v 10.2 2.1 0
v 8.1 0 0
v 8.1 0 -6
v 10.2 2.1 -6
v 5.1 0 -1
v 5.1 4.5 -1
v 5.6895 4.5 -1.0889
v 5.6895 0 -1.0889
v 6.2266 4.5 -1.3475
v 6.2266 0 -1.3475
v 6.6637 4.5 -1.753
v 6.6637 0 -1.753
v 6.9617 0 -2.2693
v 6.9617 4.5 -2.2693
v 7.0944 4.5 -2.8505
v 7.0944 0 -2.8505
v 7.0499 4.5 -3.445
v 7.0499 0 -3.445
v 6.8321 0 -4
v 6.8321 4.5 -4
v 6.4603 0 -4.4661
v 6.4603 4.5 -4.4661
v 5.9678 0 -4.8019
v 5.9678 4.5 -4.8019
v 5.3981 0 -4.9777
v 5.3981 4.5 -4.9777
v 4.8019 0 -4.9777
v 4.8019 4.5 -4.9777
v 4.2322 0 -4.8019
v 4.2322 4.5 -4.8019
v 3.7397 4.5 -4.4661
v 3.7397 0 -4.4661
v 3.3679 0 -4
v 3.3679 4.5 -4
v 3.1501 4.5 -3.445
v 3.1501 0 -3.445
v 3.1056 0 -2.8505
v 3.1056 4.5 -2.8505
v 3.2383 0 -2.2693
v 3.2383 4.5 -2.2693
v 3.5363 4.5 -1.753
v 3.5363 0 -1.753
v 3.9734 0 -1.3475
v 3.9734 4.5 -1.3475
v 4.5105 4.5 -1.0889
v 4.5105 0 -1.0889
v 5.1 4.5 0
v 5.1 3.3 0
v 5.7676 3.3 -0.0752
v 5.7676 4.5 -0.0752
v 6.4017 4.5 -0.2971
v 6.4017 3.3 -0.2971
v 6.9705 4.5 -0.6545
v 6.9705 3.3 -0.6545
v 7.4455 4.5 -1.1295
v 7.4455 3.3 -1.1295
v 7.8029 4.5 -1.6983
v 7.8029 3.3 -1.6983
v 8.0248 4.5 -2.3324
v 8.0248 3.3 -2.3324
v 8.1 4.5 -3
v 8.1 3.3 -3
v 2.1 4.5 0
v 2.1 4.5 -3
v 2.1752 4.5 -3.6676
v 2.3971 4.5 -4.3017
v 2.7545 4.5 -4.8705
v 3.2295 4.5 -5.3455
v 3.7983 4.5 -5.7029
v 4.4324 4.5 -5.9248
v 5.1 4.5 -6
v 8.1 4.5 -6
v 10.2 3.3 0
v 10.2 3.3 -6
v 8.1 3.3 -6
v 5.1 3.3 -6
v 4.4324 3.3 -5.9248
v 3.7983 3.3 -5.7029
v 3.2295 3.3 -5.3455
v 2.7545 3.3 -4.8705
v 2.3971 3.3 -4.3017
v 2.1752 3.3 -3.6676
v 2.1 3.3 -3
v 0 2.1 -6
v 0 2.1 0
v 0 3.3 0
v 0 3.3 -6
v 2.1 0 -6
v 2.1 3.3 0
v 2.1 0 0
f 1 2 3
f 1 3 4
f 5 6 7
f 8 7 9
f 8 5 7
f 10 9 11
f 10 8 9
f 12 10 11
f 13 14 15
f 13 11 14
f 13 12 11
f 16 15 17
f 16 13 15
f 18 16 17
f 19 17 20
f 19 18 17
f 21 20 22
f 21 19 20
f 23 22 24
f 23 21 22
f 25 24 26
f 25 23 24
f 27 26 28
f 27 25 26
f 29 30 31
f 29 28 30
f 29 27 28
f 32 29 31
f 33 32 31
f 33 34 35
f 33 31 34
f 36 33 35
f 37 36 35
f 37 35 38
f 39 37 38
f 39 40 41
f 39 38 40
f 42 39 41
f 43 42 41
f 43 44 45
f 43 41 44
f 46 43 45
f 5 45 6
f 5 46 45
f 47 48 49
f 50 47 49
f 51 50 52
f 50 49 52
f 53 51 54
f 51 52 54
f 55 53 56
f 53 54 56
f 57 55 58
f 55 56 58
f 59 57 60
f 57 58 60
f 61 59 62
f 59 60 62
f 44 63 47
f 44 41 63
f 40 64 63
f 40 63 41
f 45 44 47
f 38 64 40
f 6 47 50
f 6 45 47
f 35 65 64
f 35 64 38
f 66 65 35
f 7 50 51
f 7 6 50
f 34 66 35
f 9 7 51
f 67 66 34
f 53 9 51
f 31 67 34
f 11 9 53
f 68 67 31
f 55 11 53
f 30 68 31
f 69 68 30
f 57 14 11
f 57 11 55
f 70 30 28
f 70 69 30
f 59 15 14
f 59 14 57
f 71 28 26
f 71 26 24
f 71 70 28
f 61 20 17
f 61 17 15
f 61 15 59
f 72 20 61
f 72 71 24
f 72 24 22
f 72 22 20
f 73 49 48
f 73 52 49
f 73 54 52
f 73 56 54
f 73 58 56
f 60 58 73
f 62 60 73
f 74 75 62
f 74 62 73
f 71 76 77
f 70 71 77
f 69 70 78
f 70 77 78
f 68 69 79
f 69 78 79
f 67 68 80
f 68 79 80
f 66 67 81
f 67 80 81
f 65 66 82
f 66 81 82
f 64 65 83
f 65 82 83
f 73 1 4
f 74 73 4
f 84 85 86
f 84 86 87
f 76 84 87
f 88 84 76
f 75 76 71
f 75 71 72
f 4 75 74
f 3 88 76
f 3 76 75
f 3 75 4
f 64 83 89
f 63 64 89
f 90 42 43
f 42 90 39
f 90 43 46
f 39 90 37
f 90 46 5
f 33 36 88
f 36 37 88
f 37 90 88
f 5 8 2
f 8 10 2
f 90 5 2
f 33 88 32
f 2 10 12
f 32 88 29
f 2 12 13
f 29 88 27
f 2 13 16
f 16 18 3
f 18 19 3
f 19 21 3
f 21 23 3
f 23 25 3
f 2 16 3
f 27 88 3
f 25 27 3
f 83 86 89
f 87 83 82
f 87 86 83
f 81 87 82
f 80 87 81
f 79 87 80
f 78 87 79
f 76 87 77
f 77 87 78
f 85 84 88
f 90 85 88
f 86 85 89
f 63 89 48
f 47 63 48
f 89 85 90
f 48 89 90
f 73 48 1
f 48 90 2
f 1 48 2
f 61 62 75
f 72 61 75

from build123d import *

# Parameters (mm, degrees)
SKETCH_1_W          = 10.2
SKETCH_1_H          = 6
EXTRUDE_1_DEPTH     = 3.3
EXTRUDE_START       = 3.3
EXTRUDE_2_DEPTH     = 1.2
CUT_EXTRUDE_2_DEPTH = 13.660568708
SKETCH_2_5_R        = 2
CUT_EXTRUDE_4_DEPTH = 13.660568708


with BuildPart() as part:
    # 草图1 → 凸台-拉伸1 (new body)
    with BuildSketch(Plane(origin=(0, 0, 0), x_dir=(1, 0, 0), z_dir=(0, 1, 0))):
        with Locations((5.1, 3)):
            Rectangle(SKETCH_1_W, SKETCH_1_H)
    extrude(amount=EXTRUDE_1_DEPTH)

    # 草图2 → 凸台-拉伸2 (add)
    with BuildSketch(Plane(origin=(0, 0, 0), x_dir=(1, 0, 0), z_dir=(0, 1, 0)).offset(EXTRUDE_START)):
        with BuildLine():
            Line((2.1, 3), (2.1, 0))
            Line((2.1, 0), (5.1, 0))
            ThreePointArc((5.1, 0), (7.221320344, 0.878679656), (8.1, 3))
            Line((8.1, 3), (8.1, 6))
            Line((8.1, 6), (5.1, 6))
            ThreePointArc((5.1, 6), (2.978679656, 5.121320344), (2.1, 3))
        make_face()
    extrude(amount=EXTRUDE_2_DEPTH)

    # 草图3 → 切除-拉伸2 (cut, through all)
    with BuildSketch(Plane.XY):
        Polygon((0, 2.1), (2.1, 0), (0, 0), align=None)
        Polygon((8.1, 0), (10.2, 2.1), (10.2, 0), align=None)
    extrude(amount=-CUT_EXTRUDE_2_DEPTH, mode=Mode.SUBTRACT)

    # 草图2<5> → 切除-拉伸4 (cut, through all)
    with BuildSketch(Plane(origin=(0, 0, 0), x_dir=(1, 0, 0), z_dir=(0, 1, 0))):
        with Locations(Location((5.1, 3, 0), (0, 0, 270))):
            Circle(SKETCH_2_5_R)
    extrude(amount=CUT_EXTRUDE_4_DEPTH, mode=Mode.SUBTRACT)


solid = part.part
